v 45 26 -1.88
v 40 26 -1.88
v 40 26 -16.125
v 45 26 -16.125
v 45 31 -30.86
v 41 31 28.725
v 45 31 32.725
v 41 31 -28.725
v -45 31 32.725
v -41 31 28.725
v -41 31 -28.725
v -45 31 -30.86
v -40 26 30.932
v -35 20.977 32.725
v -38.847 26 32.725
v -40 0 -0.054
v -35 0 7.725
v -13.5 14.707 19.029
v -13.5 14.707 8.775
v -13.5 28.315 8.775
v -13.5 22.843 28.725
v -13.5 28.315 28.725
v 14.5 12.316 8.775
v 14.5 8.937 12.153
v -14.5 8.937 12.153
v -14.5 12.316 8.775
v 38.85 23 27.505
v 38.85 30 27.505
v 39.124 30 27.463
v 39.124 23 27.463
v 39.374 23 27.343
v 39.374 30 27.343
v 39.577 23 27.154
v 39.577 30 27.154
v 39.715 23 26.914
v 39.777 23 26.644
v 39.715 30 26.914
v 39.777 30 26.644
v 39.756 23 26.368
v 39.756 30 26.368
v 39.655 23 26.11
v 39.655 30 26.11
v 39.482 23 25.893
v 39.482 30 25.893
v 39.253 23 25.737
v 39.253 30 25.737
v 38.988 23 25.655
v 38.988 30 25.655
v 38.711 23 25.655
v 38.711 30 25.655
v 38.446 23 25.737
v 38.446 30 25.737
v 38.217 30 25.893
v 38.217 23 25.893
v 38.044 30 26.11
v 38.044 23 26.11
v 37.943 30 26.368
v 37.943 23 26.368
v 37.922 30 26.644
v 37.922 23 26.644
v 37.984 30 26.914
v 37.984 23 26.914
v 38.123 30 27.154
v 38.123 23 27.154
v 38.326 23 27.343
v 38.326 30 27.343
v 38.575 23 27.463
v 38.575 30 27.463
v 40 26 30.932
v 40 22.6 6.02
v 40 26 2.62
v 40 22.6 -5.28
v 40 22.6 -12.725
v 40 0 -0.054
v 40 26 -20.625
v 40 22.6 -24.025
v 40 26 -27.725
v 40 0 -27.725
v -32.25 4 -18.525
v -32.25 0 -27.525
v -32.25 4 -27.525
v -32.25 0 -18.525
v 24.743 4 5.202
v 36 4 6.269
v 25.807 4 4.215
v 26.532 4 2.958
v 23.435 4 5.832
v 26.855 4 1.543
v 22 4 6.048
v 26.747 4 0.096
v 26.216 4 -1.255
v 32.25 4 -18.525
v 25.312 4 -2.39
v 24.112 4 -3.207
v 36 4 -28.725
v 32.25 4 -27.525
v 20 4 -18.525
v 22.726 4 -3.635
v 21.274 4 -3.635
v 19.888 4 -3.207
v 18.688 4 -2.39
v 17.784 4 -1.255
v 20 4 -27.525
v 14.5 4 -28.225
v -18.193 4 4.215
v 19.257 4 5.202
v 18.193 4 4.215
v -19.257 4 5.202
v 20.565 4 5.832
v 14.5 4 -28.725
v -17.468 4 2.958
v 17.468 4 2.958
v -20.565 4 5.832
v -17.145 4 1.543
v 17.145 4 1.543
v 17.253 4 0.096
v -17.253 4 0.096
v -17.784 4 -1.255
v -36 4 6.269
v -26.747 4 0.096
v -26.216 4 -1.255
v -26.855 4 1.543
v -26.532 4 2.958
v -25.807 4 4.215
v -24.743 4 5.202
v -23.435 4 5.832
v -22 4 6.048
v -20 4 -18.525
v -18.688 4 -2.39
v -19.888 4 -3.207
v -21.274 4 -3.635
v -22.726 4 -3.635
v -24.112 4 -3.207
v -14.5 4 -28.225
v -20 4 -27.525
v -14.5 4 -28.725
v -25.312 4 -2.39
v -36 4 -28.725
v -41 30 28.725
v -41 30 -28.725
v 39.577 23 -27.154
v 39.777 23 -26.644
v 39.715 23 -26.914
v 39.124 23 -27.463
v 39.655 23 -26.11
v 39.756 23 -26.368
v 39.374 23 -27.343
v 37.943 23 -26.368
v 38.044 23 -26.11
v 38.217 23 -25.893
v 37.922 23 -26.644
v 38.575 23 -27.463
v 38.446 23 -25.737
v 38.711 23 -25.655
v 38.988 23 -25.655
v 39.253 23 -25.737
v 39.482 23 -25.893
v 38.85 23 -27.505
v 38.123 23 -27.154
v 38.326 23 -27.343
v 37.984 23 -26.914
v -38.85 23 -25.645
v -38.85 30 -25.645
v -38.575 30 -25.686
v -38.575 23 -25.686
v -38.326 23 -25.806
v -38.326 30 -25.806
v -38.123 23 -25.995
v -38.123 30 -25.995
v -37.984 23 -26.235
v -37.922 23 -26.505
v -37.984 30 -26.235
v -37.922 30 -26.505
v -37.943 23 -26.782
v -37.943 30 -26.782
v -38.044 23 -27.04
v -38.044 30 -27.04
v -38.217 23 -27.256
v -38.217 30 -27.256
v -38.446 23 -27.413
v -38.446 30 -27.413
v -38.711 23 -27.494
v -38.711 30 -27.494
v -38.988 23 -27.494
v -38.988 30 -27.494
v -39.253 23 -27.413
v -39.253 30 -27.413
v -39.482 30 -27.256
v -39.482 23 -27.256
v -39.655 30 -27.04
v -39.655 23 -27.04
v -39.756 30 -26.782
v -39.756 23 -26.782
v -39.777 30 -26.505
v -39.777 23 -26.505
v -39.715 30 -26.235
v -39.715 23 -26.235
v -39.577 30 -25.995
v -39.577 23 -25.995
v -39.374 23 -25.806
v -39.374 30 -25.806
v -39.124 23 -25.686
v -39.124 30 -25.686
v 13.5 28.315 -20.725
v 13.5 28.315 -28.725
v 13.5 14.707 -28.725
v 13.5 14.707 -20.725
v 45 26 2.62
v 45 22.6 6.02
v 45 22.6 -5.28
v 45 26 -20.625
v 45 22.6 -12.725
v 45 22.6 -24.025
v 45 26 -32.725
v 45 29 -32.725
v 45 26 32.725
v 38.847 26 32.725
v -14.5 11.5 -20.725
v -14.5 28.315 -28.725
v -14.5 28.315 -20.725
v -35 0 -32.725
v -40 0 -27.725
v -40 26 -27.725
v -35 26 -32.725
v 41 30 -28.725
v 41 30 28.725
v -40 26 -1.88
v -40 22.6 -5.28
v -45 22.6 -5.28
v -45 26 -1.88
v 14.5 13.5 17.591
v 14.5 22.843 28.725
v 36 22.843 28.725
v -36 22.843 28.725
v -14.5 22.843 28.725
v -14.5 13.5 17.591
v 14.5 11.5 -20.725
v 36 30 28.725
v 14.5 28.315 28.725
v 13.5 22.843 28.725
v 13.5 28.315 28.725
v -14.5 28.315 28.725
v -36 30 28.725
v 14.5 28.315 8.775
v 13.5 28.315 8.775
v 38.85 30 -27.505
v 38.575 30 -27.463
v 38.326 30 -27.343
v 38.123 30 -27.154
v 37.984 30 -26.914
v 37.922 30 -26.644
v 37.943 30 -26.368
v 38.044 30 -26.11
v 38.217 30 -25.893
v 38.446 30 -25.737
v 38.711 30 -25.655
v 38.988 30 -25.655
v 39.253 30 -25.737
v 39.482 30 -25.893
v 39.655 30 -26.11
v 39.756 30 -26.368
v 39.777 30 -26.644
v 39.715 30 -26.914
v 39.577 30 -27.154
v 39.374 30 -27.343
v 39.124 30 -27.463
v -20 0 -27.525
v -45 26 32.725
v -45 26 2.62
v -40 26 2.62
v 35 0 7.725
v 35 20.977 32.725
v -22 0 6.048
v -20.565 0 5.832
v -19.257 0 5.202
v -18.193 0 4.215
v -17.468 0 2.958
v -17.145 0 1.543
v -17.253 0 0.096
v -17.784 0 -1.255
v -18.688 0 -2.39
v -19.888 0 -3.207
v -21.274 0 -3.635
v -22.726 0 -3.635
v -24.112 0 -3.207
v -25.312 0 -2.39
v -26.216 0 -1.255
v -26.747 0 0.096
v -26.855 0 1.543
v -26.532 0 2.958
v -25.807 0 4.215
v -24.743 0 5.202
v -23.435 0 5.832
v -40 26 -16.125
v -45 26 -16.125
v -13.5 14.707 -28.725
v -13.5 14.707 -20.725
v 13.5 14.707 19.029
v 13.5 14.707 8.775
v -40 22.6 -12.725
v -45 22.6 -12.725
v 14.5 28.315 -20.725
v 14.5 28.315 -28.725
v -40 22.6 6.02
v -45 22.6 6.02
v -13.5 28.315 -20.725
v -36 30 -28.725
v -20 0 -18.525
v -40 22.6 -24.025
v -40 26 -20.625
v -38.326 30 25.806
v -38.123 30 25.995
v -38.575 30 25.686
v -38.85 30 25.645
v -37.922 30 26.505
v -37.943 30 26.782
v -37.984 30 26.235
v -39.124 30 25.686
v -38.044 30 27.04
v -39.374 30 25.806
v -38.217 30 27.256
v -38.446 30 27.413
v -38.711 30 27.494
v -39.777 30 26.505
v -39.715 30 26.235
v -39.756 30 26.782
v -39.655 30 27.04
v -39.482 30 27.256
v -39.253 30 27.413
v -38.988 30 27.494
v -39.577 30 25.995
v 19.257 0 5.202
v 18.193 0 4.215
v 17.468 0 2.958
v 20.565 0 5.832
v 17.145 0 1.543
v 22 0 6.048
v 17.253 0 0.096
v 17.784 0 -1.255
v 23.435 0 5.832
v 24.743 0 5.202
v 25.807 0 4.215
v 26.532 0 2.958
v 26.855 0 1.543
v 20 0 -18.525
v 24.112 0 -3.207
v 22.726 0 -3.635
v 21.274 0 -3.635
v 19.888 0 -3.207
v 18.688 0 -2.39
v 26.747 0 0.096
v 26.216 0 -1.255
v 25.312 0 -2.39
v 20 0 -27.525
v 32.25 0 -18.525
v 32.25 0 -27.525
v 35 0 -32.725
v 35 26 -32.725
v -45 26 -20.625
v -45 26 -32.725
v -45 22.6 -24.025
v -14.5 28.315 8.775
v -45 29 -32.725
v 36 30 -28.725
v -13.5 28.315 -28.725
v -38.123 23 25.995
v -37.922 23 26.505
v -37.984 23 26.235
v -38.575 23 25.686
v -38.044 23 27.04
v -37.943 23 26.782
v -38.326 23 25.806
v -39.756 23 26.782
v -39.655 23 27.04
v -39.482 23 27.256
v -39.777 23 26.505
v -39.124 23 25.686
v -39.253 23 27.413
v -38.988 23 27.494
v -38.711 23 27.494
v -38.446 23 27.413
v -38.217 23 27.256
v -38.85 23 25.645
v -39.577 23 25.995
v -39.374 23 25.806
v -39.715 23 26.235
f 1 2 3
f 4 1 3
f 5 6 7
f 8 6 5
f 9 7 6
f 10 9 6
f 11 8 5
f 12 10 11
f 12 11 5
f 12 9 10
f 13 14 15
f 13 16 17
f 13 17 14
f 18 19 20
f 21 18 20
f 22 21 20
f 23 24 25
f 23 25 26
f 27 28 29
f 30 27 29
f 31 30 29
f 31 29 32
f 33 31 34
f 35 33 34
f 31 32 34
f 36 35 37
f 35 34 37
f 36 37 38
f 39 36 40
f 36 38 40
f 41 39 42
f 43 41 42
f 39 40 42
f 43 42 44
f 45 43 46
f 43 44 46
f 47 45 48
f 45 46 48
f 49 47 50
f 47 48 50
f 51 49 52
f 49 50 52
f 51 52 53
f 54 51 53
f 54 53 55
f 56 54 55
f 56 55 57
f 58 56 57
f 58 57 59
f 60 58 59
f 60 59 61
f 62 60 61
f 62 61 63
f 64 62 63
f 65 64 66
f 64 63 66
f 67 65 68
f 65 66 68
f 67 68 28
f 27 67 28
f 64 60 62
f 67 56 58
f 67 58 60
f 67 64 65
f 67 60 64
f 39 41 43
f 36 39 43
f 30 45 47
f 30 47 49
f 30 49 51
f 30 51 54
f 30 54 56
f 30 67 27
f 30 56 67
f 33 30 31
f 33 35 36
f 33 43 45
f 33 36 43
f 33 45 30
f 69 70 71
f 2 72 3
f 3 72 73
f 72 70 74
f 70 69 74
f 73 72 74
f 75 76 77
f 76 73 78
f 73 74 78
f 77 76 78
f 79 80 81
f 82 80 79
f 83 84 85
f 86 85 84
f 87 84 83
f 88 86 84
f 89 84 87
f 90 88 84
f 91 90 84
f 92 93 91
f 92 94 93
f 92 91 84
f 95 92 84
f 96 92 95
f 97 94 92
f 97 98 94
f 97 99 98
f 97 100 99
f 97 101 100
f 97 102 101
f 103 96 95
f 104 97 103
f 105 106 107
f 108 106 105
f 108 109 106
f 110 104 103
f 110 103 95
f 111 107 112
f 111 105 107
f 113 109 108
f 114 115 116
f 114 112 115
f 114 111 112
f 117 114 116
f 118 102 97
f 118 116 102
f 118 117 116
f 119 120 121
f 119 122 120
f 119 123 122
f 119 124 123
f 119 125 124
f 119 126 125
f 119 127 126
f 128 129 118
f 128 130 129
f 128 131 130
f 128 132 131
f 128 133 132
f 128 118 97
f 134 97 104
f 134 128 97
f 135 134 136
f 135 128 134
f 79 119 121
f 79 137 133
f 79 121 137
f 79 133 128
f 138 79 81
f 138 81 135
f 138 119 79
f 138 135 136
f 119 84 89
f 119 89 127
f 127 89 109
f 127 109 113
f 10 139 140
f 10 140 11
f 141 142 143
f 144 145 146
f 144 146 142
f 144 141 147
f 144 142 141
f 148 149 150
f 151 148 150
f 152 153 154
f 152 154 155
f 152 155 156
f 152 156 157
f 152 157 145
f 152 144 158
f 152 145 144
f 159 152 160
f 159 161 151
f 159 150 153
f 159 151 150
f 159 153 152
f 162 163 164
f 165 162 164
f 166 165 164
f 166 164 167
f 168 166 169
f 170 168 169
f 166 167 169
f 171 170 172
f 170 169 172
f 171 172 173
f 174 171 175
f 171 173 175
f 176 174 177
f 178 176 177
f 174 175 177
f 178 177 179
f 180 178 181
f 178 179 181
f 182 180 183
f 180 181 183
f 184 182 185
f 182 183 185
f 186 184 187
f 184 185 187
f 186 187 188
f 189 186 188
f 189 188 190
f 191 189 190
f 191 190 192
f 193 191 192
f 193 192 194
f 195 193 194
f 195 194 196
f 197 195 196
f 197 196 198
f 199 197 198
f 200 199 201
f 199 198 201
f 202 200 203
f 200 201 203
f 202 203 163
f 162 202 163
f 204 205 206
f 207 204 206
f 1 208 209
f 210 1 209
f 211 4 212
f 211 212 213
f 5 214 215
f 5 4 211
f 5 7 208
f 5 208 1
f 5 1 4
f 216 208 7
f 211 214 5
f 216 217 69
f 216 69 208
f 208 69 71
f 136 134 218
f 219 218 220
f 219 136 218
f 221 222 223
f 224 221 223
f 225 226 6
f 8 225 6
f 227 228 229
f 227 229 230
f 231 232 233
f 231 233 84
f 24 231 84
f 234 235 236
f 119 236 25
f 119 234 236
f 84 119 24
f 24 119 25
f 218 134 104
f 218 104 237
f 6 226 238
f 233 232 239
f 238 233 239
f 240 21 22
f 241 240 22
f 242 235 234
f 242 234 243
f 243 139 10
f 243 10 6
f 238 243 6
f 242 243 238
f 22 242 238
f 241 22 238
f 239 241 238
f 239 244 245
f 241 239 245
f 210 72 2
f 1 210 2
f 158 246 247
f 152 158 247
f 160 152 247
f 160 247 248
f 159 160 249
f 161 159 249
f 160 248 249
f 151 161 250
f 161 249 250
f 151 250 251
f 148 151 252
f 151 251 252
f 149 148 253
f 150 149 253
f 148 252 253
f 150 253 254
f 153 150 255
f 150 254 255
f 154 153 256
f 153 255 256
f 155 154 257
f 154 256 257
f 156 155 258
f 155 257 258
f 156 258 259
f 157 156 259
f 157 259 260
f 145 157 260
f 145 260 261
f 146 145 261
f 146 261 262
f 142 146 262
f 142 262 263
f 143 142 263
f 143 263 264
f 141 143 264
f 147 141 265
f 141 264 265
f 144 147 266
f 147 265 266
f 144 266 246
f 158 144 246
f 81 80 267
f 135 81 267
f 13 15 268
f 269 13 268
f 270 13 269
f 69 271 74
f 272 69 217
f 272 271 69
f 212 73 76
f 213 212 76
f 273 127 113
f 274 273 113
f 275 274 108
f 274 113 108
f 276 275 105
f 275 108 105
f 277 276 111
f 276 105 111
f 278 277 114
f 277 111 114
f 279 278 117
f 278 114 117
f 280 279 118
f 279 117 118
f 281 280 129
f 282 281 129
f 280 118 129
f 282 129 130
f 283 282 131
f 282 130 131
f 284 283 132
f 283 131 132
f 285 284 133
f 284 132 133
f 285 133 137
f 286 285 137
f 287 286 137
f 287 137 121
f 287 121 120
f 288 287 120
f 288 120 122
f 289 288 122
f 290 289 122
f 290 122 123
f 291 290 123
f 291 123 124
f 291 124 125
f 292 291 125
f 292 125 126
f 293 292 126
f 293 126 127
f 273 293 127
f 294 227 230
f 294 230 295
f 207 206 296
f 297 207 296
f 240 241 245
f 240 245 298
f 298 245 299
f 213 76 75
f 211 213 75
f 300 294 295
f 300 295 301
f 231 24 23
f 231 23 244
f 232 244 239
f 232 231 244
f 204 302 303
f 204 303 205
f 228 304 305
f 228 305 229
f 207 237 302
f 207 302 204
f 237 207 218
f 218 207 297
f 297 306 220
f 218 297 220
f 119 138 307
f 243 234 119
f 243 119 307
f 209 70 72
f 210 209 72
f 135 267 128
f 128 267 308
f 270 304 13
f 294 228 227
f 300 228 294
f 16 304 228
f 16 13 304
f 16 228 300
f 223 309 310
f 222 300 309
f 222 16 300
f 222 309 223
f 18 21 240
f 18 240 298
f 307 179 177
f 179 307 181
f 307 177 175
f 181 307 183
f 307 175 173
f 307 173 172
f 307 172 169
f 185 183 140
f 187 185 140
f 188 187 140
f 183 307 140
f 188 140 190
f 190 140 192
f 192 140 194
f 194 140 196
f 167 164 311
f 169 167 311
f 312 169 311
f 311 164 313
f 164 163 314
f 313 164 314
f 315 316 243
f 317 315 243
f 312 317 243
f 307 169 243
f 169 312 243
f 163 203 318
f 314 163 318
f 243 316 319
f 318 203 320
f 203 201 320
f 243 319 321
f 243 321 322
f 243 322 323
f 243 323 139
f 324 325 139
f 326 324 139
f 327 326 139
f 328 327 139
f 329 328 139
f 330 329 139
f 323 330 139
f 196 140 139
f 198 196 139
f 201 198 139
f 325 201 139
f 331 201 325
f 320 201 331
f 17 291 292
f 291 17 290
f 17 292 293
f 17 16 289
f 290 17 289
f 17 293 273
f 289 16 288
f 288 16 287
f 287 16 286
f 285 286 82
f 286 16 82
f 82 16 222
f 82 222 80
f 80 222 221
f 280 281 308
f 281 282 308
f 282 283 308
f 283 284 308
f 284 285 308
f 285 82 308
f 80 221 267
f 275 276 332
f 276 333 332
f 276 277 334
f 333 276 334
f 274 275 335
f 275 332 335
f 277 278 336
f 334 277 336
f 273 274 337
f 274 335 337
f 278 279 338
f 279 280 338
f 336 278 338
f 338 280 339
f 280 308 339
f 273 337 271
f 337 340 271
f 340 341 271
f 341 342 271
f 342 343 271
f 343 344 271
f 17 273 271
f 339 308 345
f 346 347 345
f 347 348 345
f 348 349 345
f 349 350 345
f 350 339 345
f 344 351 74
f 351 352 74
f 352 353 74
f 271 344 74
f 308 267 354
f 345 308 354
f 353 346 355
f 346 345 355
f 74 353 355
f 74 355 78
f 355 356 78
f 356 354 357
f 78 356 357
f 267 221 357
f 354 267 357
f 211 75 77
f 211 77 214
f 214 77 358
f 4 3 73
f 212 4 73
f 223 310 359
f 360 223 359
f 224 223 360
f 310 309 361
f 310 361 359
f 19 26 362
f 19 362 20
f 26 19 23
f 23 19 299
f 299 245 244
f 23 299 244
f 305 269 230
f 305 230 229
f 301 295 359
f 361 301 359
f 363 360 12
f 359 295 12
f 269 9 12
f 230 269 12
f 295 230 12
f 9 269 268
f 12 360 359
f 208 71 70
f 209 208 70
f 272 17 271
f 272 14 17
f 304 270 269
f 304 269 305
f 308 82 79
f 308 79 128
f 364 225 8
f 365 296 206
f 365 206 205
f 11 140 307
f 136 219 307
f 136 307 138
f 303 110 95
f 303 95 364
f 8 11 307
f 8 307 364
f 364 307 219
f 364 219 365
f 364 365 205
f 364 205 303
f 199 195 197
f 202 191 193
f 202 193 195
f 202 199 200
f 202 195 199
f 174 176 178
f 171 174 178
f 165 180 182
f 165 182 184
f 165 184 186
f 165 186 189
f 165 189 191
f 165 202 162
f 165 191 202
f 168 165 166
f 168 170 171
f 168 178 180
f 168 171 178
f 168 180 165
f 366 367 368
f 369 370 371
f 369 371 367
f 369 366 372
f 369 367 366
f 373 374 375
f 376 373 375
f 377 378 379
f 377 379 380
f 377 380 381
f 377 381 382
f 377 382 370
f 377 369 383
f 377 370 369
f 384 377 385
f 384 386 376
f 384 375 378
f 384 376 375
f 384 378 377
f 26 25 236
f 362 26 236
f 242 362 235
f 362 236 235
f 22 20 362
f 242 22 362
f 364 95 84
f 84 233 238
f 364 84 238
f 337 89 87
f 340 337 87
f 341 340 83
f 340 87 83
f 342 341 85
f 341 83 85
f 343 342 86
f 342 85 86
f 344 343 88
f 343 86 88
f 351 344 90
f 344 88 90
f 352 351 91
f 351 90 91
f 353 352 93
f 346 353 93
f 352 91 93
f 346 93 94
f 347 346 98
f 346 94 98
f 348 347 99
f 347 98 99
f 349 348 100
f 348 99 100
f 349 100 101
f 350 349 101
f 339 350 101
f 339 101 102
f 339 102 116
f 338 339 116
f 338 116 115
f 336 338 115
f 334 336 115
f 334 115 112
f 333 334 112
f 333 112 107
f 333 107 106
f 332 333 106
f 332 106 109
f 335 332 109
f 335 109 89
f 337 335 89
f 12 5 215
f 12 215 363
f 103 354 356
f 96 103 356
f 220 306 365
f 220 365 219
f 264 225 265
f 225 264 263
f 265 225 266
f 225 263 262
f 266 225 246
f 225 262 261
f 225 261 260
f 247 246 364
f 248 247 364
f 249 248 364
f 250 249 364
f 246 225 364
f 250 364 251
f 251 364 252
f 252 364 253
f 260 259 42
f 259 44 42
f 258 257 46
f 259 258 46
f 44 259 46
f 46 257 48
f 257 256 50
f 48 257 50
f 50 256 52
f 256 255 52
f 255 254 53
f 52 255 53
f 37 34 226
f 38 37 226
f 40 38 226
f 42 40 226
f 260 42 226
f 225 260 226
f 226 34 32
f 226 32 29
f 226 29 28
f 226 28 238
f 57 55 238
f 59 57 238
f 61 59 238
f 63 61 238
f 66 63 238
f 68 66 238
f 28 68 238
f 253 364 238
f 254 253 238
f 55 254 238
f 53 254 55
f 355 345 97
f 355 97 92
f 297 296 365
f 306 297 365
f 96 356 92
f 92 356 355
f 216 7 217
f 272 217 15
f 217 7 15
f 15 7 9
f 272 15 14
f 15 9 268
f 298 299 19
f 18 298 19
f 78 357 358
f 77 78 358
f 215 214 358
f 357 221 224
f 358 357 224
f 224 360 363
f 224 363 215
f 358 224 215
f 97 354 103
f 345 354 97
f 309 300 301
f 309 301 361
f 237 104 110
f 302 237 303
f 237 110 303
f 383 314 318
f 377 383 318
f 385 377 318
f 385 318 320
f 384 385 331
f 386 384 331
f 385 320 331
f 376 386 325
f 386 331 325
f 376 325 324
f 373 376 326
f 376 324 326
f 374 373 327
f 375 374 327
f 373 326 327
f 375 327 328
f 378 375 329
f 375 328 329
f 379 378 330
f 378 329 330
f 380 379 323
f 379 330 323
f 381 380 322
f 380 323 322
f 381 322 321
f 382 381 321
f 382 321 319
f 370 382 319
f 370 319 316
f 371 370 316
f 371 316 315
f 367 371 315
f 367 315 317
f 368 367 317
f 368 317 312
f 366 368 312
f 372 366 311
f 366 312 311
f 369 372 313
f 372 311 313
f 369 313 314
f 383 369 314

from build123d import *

# Parameters (mm, degrees)
SKETCH1_W           = 80
SKETCH1_H           = 65.45
BOSS_EXTRUDE1_DEPTH = 31
BOSS_EXTRUDE3_DEPTH = 5
CHAMFER2_SIZE       = 25
CHAMFER2_SIZE2      = 20.977490779
SHELL2_START        = -36
SHELL2_DEPTH        = 72
SHELL2_START_2      = -41
SHELL2_2_OUTLINE_W  = 1
SHELL2_2_OUTLINE_H  = 57.45
SHELL2_2_DEPTH      = 82
SKETCH6_R           = 4.86874318
CUT_EXTRUDE1_DEPTH  = 5
BOSS_EXTRUDE4_DEPTH = 8
BOSS_EXTRUDE5_REACH = 107.939
BOSS_EXTRUDE5_START = 29.5
SKETCH10_W          = 12.25
SKETCH10_H          = 9
CUT_EXTRUDE2_DEPTH  = 6
CHAMFER3_SIZE       = 2
CHAMFER3_SIZE2      = 1.865030172
CHAMFER4_SIZE       = 7.098078142
CHAMFER4_SIZE_2     = 10
CHAMFER5_SIZE       = 10
CHAMFER7_SIZE       = 5
SKETCH11_R          = 0.93
CUT_EXTRUDE3_DEPTH  = 7


# Read off the part's stored shape, not the designer's step: Shell2
with BuildPart() as part:
    # Sketch1 → Boss-Extrude1 (new body)
    with BuildSketch(Plane(origin=(0, 0, 0), x_dir=(1, 0, 0), z_dir=(0, 1, 0))):
        Rectangle(SKETCH1_W, SKETCH1_H)
    extrude(amount=BOSS_EXTRUDE1_DEPTH)

    # Sketch5 → Boss-Extrude3 (add)
    with BuildSketch(Plane.ZY.offset(40)):
        Polygon((-32.725, 31), (-20.625, 31), (8.005, 31), (32.725, 31), (32.725, 26), (2.6203214, 26), (6.0203214, 22.6), (-5.2796786, 22.6), (-1.8796786, 26), (-16.125, 26), (-12.725, 22.6), (-24.025, 22.6), (-20.625, 26), (-32.725, 26), align=None)
    boss_extrude3 = extrude(amount=BOSS_EXTRUDE3_DEPTH)

    # Mirror1: Boss-Extrude3 across plane
    add(boss_extrude3.mirror(Plane(origin=(0, 0, 0), x_dir=(0, 0, 1), z_dir=(1, 0, 0))))

    # Chamfer2
    chamfer2_edges = [part.edges().sort_by_distance(p)[0] for p in [
        (0, 0, 32.725),
    ]]
    chamfer2_side = [part.faces().sort_by_distance(p)[0] for p in [
        (0, 0, 0),
    ]]
    chamfer(chamfer2_edges, length=CHAMFER2_SIZE, length2=CHAMFER2_SIZE2, reference=chamfer2_side[0])

    # Shell2 outline → Shell2 (cut)
    with BuildSketch(Plane.YZ.offset(SHELL2_START)):
        Polygon((22.842721412, 28.725), (4, 6.269119063), (4, -28.725), (31, -28.725), (31, 28.725), align=None)
    extrude(amount=SHELL2_DEPTH, mode=Mode.SUBTRACT)

    # Shell2 2 outline → Shell2 2 (cut)
    with BuildSketch(Plane.YZ.offset(SHELL2_START_2)):
        with Locations((30.5, 0)):
            Rectangle(SHELL2_2_OUTLINE_W, SHELL2_2_OUTLINE_H)
    extrude(amount=SHELL2_2_DEPTH, mode=Mode.SUBTRACT)

    # Sketch6 → Cut-Extrude1 (cut)
    with BuildSketch(Plane(origin=(0, 4, 24.632603001), x_dir=(1, 0, 0), z_dir=(0, 1, 0))):
        with Locations(Location((22, 23.453346141, 0), (0, 0, 270))):
            Circle(SKETCH6_R)
        with Locations(Location((-22, 23.453346141, 0), (0, 0, 270))):
            Circle(SKETCH6_R)
    extrude(amount=-CUT_EXTRUDE1_DEPTH, mode=Mode.SUBTRACT)

    # Sketch7 → Boss-Extrude4 (add)
    with BuildSketch(Plane.XY.offset(-28.725)):
        Polygon((-14.5, 13.5), (14.5, 13.5), (14.5, 28.31455183), (13.5, 28.31455183), (13.5, 14.706896552), (-13.5, 14.706896552), (-13.5, 28.31455183), (-14.5, 28.31455183), align=None)
    extrude(amount=BOSS_EXTRUDE4_DEPTH)

    # Sketch8 → Boss-Extrude5 (add, up to next)
    with BuildSketch(Plane.XY.offset(-20.725).offset(BOSS_EXTRUDE5_START), mode=Mode.PRIVATE) as boss_extrude5_sk1:
        Polygon((-13.5, 14.706896552), (-13.5, 28.31455183), (-14.5, 28.31455183), (-14.5, 14.706896552), (-14.5, 13.5), (-13.5, 13.5), (13.5, 13.5), (14.5, 13.5), (14.5, 14.706896552), (14.5, 28.31455183), (13.5, 28.31455183), (13.5, 14.706896552), align=None)
    boss_extrude5_tool1 = extrude(boss_extrude5_sk1.sketch, amount=BOSS_EXTRUDE5_REACH, mode=Mode.PRIVATE) - part.part
    add(boss_extrude5_tool1.solids().sort_by_distance((-14.174351, 21.510724, 8.775))[0])

    # Sketch10 → Cut-Extrude2 (cut)
    with BuildSketch(Plane.XZ):
        with Locations((-26.125, -23.025)):
            Rectangle(SKETCH10_W, SKETCH10_H)
        with Locations((26.125, -23.025)):
            Rectangle(SKETCH10_W, SKETCH10_H)
    extrude(amount=-CUT_EXTRUDE2_DEPTH, mode=Mode.SUBTRACT)

    # Chamfer3
    chamfer3_edges = [part.edges().sort_by_distance(p)[0] for p in [
        (0, 31, -32.725),
    ]]
    chamfer3_side = [part.faces().sort_by_distance(p)[0] for p in [
        (0, 15.756916996, -32.725),
    ]]
    chamfer(chamfer3_edges, length=CHAMFER3_SIZE, length2=CHAMFER3_SIZE2, reference=chamfer3_side[0])

    # Chamfer4
    # the kernel refuses this chamfer: 10, 7.098078142 mm, written as the material it adds along each edge
    with BuildSketch(Plane(origin=(14.5, 13.5, 17.590778193), x_dir=(0, -0.6849156240265527, -0.728622390518105), z_dir=(-1, 0, 0))) as chamfer4_piece_1_section:
        Polygon((CHAMFER4_SIZE * 0.998412410217, -CHAMFER4_SIZE * 0.0563263630269), (CHAMFER4_SIZE_2 * 0.728622390518, -CHAMFER4_SIZE_2 * 0.684915624027), (0, 0), align=None)
    chamfer4_piece_1 = extrude(amount=29, mode=Mode.PRIVATE)
    chamfer4_piece_1 = split(chamfer4_piece_1, bisect_by=Plane(origin=(0, 11.943437141, 8.775), z_dir=(0, 0, 1)), keep=Keep.TOP, mode=Mode.PRIVATE)
    add(chamfer4_piece_1)

    # Chamfer5
    # the kernel refuses this chamfer: 10 mm, written as the material it adds along each edge
    with BuildSketch(Plane(origin=(-14.5, 13.5, -28.725), x_dir=(0, -0.9996219169112968, -0.02749587661058701), z_dir=(1, 0, 0))) as chamfer5_piece_1_section:
        Polygon((CHAMFER5_SIZE * 0.999621916911, -CHAMFER5_SIZE * 0.0274958766106), (-CHAMFER5_SIZE * 0.0274958766106, -CHAMFER5_SIZE * 0.999621916911), (0, 0), align=None)
    chamfer5_piece_1 = extrude(amount=29, mode=Mode.PRIVATE)
    chamfer5_piece_1 = split(chamfer5_piece_1, bisect_by=Plane(origin=(0, 10.042815877, -20.725), z_dir=(0, 0, -1)), keep=Keep.TOP, mode=Mode.PRIVATE)
    add(chamfer5_piece_1)

    # Chamfer7
    chamfer7_edges = [part.edges().sort_by_distance(p)[0] for p in [
        (40, 10.48874539, 20.225),
        (-40, 10.48874539, 20.225),
        (-40, 13, -32.725),
        (40, 13, -32.725),
    ]]
    chamfer(chamfer7_edges, length=CHAMFER7_SIZE)

    # Sketch11 → Cut-Extrude3 (cut)
    with BuildSketch(Plane(origin=(0, 30, 0), x_dir=(1, 0, 0), z_dir=(0, 1, 0))):
        with Locations(Location((38.849613738, -26.574613738, 0), (0, 0, 270))):
            Circle(SKETCH11_R)
        with Locations(Location((38.849613738, 26.574613738, 0), (0, 0, 90))):
            Circle(SKETCH11_R)
        with Locations(Location((-38.849613738, 26.574613738, 0), (0, 0, 270))):
            Circle(SKETCH11_R)
        with Locations(Location((-38.849613738, -26.574613738, 0), (0, 0, 90))):
            Circle(SKETCH11_R)
    extrude(amount=-CUT_EXTRUDE3_DEPTH, mode=Mode.SUBTRACT)


solid = part.part
